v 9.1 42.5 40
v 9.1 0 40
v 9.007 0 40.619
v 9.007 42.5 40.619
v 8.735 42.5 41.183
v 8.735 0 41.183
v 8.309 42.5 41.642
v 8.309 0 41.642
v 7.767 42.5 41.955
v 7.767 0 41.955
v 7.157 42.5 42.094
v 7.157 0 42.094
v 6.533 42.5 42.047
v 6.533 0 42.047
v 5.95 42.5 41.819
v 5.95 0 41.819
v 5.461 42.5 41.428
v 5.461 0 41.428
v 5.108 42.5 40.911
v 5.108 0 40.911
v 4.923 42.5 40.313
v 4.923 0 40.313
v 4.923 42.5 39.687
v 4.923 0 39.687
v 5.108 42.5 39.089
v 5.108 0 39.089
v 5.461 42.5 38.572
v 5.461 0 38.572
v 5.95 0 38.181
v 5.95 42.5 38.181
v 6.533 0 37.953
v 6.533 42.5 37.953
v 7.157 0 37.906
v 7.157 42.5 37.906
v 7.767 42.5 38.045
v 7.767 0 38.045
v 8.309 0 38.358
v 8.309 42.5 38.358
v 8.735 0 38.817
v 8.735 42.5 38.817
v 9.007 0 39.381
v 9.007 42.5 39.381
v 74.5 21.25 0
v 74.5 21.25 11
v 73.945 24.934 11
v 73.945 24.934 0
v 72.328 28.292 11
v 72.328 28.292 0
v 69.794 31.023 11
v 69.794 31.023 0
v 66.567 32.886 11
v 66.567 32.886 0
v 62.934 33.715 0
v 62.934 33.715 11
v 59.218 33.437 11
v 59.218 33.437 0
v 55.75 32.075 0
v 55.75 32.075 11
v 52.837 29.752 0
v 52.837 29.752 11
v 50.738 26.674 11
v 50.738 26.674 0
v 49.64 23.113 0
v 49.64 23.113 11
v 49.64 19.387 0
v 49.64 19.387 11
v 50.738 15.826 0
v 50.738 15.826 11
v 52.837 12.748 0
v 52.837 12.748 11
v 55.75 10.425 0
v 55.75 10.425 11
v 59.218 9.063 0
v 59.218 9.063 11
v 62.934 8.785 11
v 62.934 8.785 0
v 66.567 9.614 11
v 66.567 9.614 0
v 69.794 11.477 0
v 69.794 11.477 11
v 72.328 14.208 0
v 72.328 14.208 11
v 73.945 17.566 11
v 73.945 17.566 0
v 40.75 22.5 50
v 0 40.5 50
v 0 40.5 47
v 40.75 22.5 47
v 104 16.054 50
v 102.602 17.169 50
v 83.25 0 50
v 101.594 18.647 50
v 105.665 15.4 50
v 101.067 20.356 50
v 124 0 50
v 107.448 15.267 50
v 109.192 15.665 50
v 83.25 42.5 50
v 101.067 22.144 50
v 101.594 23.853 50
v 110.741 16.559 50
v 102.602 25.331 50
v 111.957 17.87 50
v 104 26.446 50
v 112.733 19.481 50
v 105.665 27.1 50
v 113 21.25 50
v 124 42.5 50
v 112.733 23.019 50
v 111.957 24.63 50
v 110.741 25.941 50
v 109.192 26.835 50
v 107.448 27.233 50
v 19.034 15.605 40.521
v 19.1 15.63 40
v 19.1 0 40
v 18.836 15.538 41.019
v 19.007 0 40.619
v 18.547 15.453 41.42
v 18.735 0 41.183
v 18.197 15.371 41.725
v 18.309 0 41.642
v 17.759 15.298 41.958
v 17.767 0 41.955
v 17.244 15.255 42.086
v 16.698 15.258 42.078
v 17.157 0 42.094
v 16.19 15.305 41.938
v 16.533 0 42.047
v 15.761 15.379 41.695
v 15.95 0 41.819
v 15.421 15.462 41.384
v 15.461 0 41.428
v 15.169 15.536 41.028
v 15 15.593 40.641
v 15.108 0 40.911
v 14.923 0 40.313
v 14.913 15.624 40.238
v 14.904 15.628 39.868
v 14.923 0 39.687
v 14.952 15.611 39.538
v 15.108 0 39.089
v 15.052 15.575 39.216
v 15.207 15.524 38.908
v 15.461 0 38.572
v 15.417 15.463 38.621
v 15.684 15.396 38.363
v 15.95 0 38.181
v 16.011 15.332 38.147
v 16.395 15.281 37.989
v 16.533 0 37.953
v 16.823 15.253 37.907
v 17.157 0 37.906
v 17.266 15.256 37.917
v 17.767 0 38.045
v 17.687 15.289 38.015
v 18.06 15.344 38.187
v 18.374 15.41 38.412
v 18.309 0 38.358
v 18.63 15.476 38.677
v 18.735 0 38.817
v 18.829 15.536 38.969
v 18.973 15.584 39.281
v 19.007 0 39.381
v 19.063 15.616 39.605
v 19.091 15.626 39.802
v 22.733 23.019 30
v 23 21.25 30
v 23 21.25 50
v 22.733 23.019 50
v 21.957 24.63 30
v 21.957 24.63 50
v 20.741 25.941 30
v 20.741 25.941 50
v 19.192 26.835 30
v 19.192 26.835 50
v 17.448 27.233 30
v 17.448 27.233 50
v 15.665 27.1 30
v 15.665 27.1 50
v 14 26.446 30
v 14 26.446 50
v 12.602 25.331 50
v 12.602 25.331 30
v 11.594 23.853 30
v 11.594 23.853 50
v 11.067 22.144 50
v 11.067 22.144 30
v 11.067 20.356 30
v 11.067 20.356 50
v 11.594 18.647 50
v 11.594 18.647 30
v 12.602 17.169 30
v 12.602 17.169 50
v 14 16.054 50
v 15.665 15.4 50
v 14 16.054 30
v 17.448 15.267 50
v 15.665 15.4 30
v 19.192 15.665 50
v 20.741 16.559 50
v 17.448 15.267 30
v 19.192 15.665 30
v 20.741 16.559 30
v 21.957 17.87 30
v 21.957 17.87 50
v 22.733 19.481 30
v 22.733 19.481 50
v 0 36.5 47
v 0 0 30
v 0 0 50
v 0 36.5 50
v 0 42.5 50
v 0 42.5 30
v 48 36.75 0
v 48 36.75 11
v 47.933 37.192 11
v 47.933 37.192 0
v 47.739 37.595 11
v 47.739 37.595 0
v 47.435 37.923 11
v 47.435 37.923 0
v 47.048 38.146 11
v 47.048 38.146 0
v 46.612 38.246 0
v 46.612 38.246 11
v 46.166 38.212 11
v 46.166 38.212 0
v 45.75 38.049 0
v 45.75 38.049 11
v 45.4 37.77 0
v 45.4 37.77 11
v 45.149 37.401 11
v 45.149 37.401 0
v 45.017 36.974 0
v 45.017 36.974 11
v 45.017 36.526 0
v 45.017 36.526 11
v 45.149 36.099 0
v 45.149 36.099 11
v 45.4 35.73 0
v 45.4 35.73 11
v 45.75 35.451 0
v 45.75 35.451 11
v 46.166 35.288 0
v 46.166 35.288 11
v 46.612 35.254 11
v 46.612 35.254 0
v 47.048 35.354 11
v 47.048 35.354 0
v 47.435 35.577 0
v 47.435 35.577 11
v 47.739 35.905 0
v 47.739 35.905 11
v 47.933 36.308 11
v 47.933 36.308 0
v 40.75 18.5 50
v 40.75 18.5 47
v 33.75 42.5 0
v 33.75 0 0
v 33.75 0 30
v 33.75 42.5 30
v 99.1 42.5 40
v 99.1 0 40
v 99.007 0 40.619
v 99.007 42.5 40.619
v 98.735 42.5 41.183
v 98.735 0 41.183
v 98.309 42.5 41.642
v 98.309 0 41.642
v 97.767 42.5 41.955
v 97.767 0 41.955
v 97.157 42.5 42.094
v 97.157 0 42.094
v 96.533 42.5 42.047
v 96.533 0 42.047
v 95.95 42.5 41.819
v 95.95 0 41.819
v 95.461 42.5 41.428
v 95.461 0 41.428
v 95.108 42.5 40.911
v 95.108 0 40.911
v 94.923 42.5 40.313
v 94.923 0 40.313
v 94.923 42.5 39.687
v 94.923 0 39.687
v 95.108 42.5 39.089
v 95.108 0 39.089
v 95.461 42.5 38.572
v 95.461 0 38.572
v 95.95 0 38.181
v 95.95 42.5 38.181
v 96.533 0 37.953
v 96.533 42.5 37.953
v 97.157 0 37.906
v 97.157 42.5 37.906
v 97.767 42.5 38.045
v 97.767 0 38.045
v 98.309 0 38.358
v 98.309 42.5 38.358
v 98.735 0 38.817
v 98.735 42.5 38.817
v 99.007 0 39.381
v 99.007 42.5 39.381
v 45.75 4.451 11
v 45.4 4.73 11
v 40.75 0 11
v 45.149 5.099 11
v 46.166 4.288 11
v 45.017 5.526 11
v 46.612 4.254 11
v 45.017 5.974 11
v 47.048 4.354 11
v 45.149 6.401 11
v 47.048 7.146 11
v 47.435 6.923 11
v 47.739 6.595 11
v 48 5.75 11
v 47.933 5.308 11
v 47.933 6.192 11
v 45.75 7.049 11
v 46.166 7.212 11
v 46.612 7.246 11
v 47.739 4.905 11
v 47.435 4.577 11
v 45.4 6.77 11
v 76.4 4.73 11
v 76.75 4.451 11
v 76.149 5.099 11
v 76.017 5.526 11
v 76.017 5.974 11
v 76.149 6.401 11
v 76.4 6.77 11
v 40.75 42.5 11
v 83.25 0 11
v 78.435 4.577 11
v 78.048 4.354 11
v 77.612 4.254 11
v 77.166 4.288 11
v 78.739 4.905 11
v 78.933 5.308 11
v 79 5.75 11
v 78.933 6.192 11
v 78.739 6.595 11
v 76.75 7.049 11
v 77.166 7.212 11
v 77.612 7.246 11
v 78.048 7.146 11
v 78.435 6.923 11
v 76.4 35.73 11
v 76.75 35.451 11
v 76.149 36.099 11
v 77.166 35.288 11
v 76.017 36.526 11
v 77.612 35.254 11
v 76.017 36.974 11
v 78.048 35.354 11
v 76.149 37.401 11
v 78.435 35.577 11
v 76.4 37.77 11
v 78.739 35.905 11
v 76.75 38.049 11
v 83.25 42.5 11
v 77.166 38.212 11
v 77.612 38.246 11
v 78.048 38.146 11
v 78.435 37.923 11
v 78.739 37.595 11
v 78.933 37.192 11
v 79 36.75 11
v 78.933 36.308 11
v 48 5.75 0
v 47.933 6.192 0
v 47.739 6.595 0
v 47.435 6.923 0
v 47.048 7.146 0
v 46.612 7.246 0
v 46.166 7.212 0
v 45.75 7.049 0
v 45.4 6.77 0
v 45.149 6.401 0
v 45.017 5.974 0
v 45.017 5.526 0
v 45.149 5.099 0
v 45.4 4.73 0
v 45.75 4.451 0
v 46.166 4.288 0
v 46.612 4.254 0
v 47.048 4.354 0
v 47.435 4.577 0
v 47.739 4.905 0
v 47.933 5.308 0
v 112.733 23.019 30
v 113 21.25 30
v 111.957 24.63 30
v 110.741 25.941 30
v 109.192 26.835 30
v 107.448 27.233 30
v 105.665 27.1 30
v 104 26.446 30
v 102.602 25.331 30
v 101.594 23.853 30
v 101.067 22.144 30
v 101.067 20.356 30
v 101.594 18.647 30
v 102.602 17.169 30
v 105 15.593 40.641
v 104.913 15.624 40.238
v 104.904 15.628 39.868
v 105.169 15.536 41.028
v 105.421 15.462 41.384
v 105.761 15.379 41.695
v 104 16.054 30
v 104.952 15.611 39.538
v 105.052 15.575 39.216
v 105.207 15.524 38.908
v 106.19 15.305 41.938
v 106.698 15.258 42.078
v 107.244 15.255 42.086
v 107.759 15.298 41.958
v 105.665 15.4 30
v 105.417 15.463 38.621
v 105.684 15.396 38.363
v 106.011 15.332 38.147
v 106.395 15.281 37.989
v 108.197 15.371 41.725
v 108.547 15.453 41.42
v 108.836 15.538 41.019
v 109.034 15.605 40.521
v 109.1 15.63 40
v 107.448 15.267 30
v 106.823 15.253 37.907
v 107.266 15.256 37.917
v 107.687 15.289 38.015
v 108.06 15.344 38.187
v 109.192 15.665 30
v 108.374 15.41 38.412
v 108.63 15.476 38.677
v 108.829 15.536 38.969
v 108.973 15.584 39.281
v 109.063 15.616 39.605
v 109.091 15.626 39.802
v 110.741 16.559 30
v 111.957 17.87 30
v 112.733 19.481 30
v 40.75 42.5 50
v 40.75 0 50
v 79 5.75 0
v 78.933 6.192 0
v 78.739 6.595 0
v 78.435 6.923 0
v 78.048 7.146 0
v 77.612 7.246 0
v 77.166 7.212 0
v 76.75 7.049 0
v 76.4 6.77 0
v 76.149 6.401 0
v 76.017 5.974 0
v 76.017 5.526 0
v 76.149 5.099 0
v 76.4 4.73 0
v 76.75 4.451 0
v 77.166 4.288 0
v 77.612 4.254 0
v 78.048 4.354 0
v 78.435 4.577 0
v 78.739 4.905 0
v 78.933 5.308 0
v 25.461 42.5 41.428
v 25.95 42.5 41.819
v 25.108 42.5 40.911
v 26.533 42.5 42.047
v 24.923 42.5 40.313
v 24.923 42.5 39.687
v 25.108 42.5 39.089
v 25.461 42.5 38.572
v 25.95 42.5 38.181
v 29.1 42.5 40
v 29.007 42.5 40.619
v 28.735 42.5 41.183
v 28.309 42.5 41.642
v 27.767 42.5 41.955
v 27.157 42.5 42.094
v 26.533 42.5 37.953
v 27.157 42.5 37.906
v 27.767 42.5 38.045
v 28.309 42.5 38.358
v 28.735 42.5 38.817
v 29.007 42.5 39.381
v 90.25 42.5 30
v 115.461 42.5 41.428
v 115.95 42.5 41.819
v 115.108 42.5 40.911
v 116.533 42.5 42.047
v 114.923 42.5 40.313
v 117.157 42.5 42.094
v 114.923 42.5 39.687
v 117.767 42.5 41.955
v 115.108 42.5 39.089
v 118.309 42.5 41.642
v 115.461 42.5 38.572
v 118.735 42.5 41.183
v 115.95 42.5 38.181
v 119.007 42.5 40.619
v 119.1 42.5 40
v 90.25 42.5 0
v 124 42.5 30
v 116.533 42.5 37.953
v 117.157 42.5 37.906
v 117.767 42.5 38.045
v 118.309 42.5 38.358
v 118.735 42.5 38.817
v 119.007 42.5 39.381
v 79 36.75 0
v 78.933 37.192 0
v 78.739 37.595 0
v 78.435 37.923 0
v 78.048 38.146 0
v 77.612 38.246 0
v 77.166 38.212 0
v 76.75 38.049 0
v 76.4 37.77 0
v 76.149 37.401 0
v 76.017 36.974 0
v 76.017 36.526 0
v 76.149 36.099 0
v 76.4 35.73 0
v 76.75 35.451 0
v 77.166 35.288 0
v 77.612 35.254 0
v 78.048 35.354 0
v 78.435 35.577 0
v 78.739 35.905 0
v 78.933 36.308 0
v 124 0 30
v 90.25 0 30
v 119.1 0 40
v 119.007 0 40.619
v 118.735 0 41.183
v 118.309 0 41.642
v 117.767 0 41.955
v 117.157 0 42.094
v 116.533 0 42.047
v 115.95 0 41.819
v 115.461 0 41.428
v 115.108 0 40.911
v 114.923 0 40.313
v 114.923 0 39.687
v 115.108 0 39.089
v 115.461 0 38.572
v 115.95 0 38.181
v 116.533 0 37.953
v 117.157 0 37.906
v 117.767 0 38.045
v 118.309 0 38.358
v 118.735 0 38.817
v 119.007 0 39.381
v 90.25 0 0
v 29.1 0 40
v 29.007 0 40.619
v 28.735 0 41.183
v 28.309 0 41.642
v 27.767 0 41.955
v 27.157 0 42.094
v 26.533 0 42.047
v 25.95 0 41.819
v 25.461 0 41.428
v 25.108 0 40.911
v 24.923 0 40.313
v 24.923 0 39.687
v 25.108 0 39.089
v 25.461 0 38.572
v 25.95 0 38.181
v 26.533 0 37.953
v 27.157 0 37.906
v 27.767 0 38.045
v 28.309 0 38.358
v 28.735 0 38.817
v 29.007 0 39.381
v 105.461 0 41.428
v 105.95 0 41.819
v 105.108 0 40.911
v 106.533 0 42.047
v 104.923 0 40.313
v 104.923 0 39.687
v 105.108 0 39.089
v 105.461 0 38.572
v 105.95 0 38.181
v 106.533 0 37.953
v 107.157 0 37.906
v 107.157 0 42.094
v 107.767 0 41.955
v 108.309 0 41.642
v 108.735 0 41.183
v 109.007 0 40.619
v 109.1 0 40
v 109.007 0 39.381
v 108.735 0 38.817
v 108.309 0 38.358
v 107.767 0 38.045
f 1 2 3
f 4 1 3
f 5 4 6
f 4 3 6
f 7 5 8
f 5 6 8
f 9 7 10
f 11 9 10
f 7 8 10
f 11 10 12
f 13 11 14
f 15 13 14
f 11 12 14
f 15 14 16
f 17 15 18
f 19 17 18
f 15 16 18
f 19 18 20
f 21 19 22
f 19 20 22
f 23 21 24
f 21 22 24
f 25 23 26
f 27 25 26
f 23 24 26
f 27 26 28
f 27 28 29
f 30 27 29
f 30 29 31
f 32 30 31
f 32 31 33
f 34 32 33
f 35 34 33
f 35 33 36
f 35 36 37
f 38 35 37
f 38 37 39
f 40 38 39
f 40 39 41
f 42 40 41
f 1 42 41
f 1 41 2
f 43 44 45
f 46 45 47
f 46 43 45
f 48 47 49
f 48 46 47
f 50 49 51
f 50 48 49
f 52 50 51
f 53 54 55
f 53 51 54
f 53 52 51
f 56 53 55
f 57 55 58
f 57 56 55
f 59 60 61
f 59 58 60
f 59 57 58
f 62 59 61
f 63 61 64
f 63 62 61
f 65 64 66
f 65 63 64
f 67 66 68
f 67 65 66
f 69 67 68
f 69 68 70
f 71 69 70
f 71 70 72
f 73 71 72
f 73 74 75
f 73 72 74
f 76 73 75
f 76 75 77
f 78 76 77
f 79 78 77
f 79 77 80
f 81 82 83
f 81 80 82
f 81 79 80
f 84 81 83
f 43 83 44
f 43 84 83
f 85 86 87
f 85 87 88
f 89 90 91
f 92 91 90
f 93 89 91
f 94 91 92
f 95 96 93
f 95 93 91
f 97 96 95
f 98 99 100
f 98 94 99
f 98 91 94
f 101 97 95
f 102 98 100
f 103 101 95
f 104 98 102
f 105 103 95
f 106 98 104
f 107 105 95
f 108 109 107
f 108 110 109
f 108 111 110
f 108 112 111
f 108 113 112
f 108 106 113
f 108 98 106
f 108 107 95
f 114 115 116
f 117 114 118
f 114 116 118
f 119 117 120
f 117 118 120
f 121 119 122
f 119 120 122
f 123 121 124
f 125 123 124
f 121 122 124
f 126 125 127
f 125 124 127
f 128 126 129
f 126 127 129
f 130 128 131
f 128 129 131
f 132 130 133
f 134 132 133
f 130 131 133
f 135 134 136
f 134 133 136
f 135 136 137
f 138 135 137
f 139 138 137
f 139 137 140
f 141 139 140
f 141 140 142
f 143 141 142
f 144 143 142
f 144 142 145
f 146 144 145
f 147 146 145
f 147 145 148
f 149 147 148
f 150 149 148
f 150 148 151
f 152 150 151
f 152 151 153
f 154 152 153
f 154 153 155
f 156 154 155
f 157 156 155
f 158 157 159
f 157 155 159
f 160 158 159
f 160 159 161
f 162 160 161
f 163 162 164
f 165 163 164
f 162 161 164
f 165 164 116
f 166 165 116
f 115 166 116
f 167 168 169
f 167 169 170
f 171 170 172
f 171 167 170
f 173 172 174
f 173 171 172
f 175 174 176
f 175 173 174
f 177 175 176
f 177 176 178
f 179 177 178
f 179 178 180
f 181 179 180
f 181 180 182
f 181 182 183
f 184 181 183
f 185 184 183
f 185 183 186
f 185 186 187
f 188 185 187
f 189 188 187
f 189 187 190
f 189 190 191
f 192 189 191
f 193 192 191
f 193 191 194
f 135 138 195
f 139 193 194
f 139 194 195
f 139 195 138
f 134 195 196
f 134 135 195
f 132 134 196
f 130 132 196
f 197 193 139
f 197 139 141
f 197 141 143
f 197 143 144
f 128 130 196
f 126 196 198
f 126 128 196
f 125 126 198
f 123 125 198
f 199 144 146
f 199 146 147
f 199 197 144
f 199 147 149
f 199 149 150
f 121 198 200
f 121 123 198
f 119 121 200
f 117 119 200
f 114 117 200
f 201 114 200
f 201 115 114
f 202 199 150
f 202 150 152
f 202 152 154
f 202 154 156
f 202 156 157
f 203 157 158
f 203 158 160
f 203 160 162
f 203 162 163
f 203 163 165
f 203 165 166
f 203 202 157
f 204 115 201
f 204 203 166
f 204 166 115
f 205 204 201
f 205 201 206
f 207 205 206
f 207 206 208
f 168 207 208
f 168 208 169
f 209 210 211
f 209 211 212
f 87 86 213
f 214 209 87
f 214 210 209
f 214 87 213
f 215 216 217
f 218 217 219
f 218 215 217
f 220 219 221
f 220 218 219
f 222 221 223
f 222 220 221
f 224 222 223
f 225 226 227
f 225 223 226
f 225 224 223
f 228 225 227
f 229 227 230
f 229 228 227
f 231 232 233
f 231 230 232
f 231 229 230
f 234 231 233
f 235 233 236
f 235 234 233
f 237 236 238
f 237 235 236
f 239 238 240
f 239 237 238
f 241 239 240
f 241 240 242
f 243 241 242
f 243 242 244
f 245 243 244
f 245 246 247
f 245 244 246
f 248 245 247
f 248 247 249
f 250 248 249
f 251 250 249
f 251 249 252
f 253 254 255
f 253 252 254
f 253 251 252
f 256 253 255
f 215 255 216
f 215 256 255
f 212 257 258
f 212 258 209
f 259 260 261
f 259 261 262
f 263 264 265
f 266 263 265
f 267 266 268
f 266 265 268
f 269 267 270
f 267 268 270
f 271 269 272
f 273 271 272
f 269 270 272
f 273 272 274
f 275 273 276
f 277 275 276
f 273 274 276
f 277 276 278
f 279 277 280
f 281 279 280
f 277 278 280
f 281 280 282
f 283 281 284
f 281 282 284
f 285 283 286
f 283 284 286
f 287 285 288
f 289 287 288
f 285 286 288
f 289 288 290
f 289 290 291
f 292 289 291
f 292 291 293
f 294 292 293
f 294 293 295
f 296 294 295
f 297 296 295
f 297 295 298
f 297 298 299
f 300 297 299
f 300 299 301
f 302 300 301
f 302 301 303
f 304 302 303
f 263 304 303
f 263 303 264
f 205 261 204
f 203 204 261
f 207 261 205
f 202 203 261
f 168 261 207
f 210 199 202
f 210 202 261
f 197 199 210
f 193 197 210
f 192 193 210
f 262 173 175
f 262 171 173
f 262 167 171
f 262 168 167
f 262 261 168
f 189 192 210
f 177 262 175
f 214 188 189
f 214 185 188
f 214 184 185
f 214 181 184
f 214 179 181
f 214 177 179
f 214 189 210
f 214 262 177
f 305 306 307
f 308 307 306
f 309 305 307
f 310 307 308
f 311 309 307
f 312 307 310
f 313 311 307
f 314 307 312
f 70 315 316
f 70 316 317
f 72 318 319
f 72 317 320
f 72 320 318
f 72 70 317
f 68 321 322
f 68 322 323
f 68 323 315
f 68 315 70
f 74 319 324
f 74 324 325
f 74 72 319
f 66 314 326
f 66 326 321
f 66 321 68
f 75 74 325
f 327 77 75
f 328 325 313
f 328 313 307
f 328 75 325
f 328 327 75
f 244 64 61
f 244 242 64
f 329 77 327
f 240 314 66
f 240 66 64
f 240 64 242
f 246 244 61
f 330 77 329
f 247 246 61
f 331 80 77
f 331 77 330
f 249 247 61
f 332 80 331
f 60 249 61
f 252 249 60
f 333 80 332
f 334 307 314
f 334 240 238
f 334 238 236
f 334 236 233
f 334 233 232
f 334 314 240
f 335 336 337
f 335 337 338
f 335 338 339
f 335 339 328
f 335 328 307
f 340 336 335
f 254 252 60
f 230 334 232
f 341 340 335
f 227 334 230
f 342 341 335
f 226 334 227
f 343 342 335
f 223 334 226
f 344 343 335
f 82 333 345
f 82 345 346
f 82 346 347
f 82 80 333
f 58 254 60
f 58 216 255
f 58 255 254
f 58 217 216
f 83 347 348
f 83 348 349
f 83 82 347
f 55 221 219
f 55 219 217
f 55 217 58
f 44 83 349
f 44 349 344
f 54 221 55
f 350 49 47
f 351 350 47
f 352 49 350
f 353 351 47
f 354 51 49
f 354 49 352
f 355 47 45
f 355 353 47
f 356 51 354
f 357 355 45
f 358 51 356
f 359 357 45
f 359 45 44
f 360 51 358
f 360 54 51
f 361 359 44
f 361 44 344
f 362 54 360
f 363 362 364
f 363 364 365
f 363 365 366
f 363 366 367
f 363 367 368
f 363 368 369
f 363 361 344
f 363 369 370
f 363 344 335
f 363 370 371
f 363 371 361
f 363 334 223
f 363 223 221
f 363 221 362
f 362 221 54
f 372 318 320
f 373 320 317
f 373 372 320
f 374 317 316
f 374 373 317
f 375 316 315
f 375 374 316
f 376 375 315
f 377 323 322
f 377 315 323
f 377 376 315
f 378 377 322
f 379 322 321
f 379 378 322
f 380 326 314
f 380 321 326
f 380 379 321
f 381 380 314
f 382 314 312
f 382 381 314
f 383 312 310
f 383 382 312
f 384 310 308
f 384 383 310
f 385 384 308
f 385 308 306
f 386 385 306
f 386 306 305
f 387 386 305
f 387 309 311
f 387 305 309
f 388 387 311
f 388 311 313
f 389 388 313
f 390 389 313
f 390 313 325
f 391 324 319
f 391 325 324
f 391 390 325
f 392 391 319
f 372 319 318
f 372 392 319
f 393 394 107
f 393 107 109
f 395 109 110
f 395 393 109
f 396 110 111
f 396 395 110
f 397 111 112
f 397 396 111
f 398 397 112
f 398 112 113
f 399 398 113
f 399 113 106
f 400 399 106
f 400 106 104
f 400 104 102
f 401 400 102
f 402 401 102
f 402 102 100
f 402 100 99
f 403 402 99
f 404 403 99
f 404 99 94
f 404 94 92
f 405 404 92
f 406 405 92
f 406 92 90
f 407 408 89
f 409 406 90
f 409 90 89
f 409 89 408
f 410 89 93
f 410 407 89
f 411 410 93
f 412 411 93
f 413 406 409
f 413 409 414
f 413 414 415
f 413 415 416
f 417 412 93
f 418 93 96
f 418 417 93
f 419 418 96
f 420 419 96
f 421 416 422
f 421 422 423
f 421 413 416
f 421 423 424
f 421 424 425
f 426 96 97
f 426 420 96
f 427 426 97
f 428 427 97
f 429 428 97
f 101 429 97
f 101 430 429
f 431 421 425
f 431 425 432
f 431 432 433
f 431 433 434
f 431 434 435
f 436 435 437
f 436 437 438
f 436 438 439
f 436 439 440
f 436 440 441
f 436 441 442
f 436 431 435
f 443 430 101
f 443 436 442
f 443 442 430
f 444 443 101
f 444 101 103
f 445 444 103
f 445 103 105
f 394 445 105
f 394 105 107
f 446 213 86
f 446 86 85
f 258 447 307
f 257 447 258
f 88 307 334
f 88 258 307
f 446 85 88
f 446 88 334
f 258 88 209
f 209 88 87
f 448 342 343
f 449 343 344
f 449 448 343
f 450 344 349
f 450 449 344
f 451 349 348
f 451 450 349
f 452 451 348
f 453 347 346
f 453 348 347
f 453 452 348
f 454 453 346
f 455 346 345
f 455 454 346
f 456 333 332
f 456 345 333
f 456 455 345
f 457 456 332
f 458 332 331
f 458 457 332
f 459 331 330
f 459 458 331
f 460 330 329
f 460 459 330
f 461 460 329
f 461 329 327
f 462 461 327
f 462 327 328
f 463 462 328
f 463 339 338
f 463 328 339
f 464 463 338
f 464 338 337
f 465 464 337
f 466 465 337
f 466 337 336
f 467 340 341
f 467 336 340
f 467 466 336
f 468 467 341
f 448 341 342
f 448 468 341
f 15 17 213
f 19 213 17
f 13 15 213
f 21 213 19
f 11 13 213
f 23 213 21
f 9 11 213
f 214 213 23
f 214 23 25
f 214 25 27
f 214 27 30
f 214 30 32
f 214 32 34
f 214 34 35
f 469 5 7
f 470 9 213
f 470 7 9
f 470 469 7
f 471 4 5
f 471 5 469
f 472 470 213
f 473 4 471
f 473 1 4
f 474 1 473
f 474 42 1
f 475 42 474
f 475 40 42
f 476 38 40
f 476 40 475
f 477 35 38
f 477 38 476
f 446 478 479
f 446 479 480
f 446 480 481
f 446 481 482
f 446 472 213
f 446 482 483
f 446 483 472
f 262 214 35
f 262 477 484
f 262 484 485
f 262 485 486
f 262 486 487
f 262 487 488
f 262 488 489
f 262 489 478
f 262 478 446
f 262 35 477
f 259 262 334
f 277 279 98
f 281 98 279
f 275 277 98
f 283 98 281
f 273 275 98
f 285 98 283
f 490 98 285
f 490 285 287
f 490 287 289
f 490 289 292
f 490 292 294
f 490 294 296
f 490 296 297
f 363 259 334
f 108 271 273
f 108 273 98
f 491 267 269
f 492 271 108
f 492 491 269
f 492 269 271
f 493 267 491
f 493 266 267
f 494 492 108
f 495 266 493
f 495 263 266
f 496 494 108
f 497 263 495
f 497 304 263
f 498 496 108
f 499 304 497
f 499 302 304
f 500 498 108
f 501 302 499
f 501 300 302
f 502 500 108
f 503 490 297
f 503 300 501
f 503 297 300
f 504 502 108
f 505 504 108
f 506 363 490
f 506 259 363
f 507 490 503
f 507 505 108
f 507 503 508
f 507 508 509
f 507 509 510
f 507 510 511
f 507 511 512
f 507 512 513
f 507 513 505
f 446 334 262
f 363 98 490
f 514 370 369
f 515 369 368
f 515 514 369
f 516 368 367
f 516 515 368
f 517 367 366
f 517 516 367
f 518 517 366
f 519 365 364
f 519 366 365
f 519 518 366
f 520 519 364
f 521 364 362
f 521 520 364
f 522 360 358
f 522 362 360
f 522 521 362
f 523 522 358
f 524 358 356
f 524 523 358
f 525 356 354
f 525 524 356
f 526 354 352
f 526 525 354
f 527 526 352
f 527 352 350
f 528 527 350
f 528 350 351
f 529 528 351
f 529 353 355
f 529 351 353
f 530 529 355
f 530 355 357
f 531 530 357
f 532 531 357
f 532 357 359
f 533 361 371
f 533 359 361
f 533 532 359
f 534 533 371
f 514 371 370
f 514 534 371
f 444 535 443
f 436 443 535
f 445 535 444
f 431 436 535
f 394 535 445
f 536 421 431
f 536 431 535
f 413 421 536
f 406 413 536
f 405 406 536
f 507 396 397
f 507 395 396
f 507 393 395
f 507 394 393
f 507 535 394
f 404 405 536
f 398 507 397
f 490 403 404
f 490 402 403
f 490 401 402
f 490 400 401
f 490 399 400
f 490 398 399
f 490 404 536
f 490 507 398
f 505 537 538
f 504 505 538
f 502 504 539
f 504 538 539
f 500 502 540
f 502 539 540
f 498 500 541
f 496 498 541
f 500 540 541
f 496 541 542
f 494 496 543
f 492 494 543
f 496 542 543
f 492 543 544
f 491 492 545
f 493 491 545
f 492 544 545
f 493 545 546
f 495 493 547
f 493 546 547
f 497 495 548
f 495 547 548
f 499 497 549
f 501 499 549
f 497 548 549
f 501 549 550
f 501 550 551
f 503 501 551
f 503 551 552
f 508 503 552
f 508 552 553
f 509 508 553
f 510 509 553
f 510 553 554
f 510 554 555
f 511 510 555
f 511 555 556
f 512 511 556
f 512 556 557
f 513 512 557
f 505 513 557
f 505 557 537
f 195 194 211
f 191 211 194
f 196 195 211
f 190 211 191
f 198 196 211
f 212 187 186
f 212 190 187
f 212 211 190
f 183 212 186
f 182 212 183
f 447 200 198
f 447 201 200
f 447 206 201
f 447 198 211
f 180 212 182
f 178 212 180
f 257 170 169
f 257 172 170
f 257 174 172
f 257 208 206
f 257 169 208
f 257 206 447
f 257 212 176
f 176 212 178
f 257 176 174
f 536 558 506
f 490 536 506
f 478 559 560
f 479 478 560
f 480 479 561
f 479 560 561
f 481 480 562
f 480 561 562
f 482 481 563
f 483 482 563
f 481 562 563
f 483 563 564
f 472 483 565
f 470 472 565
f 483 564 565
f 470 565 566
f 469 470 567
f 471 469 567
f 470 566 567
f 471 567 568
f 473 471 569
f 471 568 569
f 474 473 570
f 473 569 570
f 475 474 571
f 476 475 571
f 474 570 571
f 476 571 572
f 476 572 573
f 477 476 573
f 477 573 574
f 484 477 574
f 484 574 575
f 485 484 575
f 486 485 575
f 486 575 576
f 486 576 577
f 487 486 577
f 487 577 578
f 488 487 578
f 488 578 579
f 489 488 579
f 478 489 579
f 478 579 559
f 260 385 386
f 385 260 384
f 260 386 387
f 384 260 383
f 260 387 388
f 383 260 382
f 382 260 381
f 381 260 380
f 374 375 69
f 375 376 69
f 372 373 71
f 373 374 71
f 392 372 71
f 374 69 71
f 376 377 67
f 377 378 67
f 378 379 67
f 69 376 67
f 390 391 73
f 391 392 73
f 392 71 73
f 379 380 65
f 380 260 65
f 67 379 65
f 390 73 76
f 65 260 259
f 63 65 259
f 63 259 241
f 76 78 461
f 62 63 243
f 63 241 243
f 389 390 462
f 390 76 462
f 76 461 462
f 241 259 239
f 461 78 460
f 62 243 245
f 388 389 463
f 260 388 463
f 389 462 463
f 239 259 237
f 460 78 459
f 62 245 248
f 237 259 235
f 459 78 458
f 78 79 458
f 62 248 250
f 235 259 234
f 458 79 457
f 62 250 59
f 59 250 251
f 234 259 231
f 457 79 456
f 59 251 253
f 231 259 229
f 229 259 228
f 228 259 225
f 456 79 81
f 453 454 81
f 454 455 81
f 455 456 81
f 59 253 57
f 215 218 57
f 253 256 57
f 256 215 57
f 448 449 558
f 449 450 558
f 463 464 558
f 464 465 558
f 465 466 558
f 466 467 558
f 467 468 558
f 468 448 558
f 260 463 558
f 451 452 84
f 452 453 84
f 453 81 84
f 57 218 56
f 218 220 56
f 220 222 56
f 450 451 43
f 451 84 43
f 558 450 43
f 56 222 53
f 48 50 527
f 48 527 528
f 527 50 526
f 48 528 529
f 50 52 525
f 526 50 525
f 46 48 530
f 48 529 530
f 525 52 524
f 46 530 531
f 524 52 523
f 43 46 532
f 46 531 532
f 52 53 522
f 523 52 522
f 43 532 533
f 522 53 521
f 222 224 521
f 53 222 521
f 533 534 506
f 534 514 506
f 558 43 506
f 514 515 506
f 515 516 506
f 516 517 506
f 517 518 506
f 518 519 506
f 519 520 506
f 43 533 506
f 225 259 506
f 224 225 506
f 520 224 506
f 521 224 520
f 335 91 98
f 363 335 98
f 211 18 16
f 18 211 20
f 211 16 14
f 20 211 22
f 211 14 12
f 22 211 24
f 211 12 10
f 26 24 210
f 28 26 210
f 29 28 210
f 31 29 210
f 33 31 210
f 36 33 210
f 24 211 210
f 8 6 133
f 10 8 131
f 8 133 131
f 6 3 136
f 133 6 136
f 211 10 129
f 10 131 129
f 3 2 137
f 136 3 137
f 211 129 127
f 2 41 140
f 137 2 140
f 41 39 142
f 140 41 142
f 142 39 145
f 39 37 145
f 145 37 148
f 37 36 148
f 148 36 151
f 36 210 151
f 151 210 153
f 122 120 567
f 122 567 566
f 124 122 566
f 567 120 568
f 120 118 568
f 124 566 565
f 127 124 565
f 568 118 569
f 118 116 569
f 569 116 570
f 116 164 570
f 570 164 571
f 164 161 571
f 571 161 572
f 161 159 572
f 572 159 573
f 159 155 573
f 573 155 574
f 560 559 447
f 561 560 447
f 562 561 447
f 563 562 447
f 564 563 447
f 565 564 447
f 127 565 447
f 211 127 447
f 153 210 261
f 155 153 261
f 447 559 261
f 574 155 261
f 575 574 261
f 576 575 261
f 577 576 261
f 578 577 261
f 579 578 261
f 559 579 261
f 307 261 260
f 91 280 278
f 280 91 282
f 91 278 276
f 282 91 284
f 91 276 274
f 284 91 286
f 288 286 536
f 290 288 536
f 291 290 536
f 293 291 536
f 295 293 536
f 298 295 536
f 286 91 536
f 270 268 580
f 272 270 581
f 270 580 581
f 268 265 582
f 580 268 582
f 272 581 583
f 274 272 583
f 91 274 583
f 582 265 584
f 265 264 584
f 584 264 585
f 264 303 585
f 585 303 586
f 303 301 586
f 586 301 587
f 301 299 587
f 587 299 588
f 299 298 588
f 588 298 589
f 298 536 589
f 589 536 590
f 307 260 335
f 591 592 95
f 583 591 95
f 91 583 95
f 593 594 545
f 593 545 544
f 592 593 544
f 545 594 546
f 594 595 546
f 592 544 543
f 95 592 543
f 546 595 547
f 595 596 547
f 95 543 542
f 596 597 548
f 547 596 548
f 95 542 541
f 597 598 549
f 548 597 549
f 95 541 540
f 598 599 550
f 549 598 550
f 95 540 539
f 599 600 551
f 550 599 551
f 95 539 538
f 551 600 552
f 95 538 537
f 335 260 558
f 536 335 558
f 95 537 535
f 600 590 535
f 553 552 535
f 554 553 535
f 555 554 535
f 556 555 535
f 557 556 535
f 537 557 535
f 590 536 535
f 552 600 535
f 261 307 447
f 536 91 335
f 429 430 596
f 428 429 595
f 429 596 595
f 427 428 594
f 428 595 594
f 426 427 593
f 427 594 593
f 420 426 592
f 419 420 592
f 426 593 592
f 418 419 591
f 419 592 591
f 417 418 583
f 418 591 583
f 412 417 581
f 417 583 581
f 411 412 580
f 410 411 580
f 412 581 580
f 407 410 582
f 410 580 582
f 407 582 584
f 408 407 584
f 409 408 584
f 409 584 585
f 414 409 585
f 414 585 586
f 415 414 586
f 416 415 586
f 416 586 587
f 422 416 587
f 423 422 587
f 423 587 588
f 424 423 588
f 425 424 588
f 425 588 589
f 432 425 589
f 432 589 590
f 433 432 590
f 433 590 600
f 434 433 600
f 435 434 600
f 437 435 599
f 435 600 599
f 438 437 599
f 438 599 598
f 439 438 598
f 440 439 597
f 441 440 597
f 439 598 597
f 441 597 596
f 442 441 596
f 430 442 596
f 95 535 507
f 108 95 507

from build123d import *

# Parameters (mm, degrees)
SKETCH2_W           = 124
SKETCH2_H           = 42.5
SKETCH2_R           = 12.5
SKETCH2_R_2         = 6
SKETCH2_R_3         = 1.5
BOSS_EXTRUDE1_DEPTH = 50
SKETCH3_W           = 42.5
SKETCH3_H           = 42.5
CUT_EXTRUDE1_DEPTH  = 39
SKETCH4_W           = 33.75
SKETCH4_H           = 42.5
CUT_EXTRUDE2_DEPTH  = 30
CUT_EXTRUDE3_REACH  = 44.5
SKETCH5_R           = 2.1
CUT_EXTRUDE4_DEPTH  = 3


with BuildPart() as part:
    # Sketch2 → Boss-Extrude1 (new body)
    with BuildSketch(Plane.XY):
        with Locations((62, 21.25)):
            Rectangle(SKETCH2_W, SKETCH2_H)
        with Locations((62, 21.25)):
            Circle(SKETCH2_R, mode=Mode.SUBTRACT)
        with Locations((107, 21.25)):
            Circle(SKETCH2_R_2, mode=Mode.SUBTRACT)
        with Locations((17, 21.25)):
            Circle(SKETCH2_R_2, mode=Mode.SUBTRACT)
        with Locations((46.5, 36.75)):
            Circle(SKETCH2_R_3, mode=Mode.SUBTRACT)
        with Locations((77.5, 36.75)):
            Circle(SKETCH2_R_3, mode=Mode.SUBTRACT)
        with Locations((77.5, 5.75)):
            Circle(SKETCH2_R_3, mode=Mode.SUBTRACT)
        with Locations((46.5, 5.75)):
            Circle(SKETCH2_R_3, mode=Mode.SUBTRACT)
    extrude(amount=BOSS_EXTRUDE1_DEPTH)

    # Sketch3 → Cut-Extrude1 (cut)
    with BuildSketch(Plane.XY.offset(50)):
        with Locations((62, 21.25)):
            Rectangle(SKETCH3_W, SKETCH3_H)
    extrude(amount=-CUT_EXTRUDE1_DEPTH, mode=Mode.SUBTRACT)

    # Sketch4 → Cut-Extrude2 (cut)
    with BuildSketch(Plane(origin=(0, 0, 0), x_dir=(-1, 0, 0), z_dir=(0, 0, -1))):
        with Locations((-107.125, 21.25)):
            Rectangle(SKETCH4_W, SKETCH4_H)
        with Locations((-16.875, 21.25)):
            Rectangle(SKETCH4_W, SKETCH4_H)
    extrude(amount=-CUT_EXTRUDE2_DEPTH, mode=Mode.SUBTRACT)

    # Sketch5 → Cut-Extrude3 (cut, up to next)
    with BuildSketch(Plane.XZ, mode=Mode.PRIVATE) as cut_extrude3_sk1:
        with Locations((7, 40)):
            Circle(SKETCH5_R)
    cut_extrude3_tool1 = extrude(cut_extrude3_sk1.sketch, amount=-CUT_EXTRUDE3_REACH, mode=Mode.PRIVATE) & part.part
    add(cut_extrude3_tool1.solids().sort_by_distance((7, 0, 40))[0], mode=Mode.SUBTRACT)
    # Sketch5 → Cut-Extrude3 (cut, up to next)
    with BuildSketch(Plane.XZ, mode=Mode.PRIVATE) as cut_extrude3_sk2:
        with Locations((27, 40)):
            Circle(SKETCH5_R)
    cut_extrude3_tool2 = extrude(cut_extrude3_sk2.sketch, amount=-CUT_EXTRUDE3_REACH, mode=Mode.PRIVATE) & part.part
    add(cut_extrude3_tool2.solids().sort_by_distance((27, 0, 40))[0], mode=Mode.SUBTRACT)
    # Sketch5 → Cut-Extrude3 (cut, up to next)
    with BuildSketch(Plane.XZ, mode=Mode.PRIVATE) as cut_extrude3_sk3:
        with Locations((97, 40)):
            Circle(SKETCH5_R)
    cut_extrude3_tool3 = extrude(cut_extrude3_sk3.sketch, amount=-CUT_EXTRUDE3_REACH, mode=Mode.PRIVATE) & part.part
    add(cut_extrude3_tool3.solids().sort_by_distance((97, 0, 40))[0], mode=Mode.SUBTRACT)
    # Sketch5 → Cut-Extrude3 (cut, up to next)
    with BuildSketch(Plane.XZ, mode=Mode.PRIVATE) as cut_extrude3_sk4:
        with Locations((117, 40)):
            Circle(SKETCH5_R)
    cut_extrude3_tool4 = extrude(cut_extrude3_sk4.sketch, amount=-CUT_EXTRUDE3_REACH, mode=Mode.PRIVATE) & part.part
    add(cut_extrude3_tool4.solids().sort_by_distance((117, 0, 40))[0], mode=Mode.SUBTRACT)
    # Sketch5 → Cut-Extrude3 (cut, up to next)
    with BuildSketch(Plane.XZ, mode=Mode.PRIVATE) as cut_extrude3_sk5:
        with Locations((17, 40)):
            Circle(SKETCH5_R)
    cut_extrude3_tool5 = extrude(cut_extrude3_sk5.sketch, amount=-CUT_EXTRUDE3_REACH, mode=Mode.PRIVATE) & part.part
    add(cut_extrude3_tool5.solids().sort_by_distance((17, 0, 40))[0], mode=Mode.SUBTRACT)
    # Sketch5 → Cut-Extrude3 (cut, up to next)
    with BuildSketch(Plane.XZ, mode=Mode.PRIVATE) as cut_extrude3_sk6:
        with Locations((107, 40)):
            Circle(SKETCH5_R)
    cut_extrude3_tool6 = extrude(cut_extrude3_sk6.sketch, amount=-CUT_EXTRUDE3_REACH, mode=Mode.PRIVATE) & part.part
    add(cut_extrude3_tool6.solids().sort_by_distance((107, 0, 40))[0], mode=Mode.SUBTRACT)

    # Sketch7 → Cut-Extrude4 (cut)
    with BuildSketch(Plane.XY.offset(50)):
        Polygon((0, 40.5), (40.75, 22.5), (40.75, 18.5), (0, 36.5), align=None)
    extrude(amount=-CUT_EXTRUDE4_DEPTH, mode=Mode.SUBTRACT)


solid = part.part
